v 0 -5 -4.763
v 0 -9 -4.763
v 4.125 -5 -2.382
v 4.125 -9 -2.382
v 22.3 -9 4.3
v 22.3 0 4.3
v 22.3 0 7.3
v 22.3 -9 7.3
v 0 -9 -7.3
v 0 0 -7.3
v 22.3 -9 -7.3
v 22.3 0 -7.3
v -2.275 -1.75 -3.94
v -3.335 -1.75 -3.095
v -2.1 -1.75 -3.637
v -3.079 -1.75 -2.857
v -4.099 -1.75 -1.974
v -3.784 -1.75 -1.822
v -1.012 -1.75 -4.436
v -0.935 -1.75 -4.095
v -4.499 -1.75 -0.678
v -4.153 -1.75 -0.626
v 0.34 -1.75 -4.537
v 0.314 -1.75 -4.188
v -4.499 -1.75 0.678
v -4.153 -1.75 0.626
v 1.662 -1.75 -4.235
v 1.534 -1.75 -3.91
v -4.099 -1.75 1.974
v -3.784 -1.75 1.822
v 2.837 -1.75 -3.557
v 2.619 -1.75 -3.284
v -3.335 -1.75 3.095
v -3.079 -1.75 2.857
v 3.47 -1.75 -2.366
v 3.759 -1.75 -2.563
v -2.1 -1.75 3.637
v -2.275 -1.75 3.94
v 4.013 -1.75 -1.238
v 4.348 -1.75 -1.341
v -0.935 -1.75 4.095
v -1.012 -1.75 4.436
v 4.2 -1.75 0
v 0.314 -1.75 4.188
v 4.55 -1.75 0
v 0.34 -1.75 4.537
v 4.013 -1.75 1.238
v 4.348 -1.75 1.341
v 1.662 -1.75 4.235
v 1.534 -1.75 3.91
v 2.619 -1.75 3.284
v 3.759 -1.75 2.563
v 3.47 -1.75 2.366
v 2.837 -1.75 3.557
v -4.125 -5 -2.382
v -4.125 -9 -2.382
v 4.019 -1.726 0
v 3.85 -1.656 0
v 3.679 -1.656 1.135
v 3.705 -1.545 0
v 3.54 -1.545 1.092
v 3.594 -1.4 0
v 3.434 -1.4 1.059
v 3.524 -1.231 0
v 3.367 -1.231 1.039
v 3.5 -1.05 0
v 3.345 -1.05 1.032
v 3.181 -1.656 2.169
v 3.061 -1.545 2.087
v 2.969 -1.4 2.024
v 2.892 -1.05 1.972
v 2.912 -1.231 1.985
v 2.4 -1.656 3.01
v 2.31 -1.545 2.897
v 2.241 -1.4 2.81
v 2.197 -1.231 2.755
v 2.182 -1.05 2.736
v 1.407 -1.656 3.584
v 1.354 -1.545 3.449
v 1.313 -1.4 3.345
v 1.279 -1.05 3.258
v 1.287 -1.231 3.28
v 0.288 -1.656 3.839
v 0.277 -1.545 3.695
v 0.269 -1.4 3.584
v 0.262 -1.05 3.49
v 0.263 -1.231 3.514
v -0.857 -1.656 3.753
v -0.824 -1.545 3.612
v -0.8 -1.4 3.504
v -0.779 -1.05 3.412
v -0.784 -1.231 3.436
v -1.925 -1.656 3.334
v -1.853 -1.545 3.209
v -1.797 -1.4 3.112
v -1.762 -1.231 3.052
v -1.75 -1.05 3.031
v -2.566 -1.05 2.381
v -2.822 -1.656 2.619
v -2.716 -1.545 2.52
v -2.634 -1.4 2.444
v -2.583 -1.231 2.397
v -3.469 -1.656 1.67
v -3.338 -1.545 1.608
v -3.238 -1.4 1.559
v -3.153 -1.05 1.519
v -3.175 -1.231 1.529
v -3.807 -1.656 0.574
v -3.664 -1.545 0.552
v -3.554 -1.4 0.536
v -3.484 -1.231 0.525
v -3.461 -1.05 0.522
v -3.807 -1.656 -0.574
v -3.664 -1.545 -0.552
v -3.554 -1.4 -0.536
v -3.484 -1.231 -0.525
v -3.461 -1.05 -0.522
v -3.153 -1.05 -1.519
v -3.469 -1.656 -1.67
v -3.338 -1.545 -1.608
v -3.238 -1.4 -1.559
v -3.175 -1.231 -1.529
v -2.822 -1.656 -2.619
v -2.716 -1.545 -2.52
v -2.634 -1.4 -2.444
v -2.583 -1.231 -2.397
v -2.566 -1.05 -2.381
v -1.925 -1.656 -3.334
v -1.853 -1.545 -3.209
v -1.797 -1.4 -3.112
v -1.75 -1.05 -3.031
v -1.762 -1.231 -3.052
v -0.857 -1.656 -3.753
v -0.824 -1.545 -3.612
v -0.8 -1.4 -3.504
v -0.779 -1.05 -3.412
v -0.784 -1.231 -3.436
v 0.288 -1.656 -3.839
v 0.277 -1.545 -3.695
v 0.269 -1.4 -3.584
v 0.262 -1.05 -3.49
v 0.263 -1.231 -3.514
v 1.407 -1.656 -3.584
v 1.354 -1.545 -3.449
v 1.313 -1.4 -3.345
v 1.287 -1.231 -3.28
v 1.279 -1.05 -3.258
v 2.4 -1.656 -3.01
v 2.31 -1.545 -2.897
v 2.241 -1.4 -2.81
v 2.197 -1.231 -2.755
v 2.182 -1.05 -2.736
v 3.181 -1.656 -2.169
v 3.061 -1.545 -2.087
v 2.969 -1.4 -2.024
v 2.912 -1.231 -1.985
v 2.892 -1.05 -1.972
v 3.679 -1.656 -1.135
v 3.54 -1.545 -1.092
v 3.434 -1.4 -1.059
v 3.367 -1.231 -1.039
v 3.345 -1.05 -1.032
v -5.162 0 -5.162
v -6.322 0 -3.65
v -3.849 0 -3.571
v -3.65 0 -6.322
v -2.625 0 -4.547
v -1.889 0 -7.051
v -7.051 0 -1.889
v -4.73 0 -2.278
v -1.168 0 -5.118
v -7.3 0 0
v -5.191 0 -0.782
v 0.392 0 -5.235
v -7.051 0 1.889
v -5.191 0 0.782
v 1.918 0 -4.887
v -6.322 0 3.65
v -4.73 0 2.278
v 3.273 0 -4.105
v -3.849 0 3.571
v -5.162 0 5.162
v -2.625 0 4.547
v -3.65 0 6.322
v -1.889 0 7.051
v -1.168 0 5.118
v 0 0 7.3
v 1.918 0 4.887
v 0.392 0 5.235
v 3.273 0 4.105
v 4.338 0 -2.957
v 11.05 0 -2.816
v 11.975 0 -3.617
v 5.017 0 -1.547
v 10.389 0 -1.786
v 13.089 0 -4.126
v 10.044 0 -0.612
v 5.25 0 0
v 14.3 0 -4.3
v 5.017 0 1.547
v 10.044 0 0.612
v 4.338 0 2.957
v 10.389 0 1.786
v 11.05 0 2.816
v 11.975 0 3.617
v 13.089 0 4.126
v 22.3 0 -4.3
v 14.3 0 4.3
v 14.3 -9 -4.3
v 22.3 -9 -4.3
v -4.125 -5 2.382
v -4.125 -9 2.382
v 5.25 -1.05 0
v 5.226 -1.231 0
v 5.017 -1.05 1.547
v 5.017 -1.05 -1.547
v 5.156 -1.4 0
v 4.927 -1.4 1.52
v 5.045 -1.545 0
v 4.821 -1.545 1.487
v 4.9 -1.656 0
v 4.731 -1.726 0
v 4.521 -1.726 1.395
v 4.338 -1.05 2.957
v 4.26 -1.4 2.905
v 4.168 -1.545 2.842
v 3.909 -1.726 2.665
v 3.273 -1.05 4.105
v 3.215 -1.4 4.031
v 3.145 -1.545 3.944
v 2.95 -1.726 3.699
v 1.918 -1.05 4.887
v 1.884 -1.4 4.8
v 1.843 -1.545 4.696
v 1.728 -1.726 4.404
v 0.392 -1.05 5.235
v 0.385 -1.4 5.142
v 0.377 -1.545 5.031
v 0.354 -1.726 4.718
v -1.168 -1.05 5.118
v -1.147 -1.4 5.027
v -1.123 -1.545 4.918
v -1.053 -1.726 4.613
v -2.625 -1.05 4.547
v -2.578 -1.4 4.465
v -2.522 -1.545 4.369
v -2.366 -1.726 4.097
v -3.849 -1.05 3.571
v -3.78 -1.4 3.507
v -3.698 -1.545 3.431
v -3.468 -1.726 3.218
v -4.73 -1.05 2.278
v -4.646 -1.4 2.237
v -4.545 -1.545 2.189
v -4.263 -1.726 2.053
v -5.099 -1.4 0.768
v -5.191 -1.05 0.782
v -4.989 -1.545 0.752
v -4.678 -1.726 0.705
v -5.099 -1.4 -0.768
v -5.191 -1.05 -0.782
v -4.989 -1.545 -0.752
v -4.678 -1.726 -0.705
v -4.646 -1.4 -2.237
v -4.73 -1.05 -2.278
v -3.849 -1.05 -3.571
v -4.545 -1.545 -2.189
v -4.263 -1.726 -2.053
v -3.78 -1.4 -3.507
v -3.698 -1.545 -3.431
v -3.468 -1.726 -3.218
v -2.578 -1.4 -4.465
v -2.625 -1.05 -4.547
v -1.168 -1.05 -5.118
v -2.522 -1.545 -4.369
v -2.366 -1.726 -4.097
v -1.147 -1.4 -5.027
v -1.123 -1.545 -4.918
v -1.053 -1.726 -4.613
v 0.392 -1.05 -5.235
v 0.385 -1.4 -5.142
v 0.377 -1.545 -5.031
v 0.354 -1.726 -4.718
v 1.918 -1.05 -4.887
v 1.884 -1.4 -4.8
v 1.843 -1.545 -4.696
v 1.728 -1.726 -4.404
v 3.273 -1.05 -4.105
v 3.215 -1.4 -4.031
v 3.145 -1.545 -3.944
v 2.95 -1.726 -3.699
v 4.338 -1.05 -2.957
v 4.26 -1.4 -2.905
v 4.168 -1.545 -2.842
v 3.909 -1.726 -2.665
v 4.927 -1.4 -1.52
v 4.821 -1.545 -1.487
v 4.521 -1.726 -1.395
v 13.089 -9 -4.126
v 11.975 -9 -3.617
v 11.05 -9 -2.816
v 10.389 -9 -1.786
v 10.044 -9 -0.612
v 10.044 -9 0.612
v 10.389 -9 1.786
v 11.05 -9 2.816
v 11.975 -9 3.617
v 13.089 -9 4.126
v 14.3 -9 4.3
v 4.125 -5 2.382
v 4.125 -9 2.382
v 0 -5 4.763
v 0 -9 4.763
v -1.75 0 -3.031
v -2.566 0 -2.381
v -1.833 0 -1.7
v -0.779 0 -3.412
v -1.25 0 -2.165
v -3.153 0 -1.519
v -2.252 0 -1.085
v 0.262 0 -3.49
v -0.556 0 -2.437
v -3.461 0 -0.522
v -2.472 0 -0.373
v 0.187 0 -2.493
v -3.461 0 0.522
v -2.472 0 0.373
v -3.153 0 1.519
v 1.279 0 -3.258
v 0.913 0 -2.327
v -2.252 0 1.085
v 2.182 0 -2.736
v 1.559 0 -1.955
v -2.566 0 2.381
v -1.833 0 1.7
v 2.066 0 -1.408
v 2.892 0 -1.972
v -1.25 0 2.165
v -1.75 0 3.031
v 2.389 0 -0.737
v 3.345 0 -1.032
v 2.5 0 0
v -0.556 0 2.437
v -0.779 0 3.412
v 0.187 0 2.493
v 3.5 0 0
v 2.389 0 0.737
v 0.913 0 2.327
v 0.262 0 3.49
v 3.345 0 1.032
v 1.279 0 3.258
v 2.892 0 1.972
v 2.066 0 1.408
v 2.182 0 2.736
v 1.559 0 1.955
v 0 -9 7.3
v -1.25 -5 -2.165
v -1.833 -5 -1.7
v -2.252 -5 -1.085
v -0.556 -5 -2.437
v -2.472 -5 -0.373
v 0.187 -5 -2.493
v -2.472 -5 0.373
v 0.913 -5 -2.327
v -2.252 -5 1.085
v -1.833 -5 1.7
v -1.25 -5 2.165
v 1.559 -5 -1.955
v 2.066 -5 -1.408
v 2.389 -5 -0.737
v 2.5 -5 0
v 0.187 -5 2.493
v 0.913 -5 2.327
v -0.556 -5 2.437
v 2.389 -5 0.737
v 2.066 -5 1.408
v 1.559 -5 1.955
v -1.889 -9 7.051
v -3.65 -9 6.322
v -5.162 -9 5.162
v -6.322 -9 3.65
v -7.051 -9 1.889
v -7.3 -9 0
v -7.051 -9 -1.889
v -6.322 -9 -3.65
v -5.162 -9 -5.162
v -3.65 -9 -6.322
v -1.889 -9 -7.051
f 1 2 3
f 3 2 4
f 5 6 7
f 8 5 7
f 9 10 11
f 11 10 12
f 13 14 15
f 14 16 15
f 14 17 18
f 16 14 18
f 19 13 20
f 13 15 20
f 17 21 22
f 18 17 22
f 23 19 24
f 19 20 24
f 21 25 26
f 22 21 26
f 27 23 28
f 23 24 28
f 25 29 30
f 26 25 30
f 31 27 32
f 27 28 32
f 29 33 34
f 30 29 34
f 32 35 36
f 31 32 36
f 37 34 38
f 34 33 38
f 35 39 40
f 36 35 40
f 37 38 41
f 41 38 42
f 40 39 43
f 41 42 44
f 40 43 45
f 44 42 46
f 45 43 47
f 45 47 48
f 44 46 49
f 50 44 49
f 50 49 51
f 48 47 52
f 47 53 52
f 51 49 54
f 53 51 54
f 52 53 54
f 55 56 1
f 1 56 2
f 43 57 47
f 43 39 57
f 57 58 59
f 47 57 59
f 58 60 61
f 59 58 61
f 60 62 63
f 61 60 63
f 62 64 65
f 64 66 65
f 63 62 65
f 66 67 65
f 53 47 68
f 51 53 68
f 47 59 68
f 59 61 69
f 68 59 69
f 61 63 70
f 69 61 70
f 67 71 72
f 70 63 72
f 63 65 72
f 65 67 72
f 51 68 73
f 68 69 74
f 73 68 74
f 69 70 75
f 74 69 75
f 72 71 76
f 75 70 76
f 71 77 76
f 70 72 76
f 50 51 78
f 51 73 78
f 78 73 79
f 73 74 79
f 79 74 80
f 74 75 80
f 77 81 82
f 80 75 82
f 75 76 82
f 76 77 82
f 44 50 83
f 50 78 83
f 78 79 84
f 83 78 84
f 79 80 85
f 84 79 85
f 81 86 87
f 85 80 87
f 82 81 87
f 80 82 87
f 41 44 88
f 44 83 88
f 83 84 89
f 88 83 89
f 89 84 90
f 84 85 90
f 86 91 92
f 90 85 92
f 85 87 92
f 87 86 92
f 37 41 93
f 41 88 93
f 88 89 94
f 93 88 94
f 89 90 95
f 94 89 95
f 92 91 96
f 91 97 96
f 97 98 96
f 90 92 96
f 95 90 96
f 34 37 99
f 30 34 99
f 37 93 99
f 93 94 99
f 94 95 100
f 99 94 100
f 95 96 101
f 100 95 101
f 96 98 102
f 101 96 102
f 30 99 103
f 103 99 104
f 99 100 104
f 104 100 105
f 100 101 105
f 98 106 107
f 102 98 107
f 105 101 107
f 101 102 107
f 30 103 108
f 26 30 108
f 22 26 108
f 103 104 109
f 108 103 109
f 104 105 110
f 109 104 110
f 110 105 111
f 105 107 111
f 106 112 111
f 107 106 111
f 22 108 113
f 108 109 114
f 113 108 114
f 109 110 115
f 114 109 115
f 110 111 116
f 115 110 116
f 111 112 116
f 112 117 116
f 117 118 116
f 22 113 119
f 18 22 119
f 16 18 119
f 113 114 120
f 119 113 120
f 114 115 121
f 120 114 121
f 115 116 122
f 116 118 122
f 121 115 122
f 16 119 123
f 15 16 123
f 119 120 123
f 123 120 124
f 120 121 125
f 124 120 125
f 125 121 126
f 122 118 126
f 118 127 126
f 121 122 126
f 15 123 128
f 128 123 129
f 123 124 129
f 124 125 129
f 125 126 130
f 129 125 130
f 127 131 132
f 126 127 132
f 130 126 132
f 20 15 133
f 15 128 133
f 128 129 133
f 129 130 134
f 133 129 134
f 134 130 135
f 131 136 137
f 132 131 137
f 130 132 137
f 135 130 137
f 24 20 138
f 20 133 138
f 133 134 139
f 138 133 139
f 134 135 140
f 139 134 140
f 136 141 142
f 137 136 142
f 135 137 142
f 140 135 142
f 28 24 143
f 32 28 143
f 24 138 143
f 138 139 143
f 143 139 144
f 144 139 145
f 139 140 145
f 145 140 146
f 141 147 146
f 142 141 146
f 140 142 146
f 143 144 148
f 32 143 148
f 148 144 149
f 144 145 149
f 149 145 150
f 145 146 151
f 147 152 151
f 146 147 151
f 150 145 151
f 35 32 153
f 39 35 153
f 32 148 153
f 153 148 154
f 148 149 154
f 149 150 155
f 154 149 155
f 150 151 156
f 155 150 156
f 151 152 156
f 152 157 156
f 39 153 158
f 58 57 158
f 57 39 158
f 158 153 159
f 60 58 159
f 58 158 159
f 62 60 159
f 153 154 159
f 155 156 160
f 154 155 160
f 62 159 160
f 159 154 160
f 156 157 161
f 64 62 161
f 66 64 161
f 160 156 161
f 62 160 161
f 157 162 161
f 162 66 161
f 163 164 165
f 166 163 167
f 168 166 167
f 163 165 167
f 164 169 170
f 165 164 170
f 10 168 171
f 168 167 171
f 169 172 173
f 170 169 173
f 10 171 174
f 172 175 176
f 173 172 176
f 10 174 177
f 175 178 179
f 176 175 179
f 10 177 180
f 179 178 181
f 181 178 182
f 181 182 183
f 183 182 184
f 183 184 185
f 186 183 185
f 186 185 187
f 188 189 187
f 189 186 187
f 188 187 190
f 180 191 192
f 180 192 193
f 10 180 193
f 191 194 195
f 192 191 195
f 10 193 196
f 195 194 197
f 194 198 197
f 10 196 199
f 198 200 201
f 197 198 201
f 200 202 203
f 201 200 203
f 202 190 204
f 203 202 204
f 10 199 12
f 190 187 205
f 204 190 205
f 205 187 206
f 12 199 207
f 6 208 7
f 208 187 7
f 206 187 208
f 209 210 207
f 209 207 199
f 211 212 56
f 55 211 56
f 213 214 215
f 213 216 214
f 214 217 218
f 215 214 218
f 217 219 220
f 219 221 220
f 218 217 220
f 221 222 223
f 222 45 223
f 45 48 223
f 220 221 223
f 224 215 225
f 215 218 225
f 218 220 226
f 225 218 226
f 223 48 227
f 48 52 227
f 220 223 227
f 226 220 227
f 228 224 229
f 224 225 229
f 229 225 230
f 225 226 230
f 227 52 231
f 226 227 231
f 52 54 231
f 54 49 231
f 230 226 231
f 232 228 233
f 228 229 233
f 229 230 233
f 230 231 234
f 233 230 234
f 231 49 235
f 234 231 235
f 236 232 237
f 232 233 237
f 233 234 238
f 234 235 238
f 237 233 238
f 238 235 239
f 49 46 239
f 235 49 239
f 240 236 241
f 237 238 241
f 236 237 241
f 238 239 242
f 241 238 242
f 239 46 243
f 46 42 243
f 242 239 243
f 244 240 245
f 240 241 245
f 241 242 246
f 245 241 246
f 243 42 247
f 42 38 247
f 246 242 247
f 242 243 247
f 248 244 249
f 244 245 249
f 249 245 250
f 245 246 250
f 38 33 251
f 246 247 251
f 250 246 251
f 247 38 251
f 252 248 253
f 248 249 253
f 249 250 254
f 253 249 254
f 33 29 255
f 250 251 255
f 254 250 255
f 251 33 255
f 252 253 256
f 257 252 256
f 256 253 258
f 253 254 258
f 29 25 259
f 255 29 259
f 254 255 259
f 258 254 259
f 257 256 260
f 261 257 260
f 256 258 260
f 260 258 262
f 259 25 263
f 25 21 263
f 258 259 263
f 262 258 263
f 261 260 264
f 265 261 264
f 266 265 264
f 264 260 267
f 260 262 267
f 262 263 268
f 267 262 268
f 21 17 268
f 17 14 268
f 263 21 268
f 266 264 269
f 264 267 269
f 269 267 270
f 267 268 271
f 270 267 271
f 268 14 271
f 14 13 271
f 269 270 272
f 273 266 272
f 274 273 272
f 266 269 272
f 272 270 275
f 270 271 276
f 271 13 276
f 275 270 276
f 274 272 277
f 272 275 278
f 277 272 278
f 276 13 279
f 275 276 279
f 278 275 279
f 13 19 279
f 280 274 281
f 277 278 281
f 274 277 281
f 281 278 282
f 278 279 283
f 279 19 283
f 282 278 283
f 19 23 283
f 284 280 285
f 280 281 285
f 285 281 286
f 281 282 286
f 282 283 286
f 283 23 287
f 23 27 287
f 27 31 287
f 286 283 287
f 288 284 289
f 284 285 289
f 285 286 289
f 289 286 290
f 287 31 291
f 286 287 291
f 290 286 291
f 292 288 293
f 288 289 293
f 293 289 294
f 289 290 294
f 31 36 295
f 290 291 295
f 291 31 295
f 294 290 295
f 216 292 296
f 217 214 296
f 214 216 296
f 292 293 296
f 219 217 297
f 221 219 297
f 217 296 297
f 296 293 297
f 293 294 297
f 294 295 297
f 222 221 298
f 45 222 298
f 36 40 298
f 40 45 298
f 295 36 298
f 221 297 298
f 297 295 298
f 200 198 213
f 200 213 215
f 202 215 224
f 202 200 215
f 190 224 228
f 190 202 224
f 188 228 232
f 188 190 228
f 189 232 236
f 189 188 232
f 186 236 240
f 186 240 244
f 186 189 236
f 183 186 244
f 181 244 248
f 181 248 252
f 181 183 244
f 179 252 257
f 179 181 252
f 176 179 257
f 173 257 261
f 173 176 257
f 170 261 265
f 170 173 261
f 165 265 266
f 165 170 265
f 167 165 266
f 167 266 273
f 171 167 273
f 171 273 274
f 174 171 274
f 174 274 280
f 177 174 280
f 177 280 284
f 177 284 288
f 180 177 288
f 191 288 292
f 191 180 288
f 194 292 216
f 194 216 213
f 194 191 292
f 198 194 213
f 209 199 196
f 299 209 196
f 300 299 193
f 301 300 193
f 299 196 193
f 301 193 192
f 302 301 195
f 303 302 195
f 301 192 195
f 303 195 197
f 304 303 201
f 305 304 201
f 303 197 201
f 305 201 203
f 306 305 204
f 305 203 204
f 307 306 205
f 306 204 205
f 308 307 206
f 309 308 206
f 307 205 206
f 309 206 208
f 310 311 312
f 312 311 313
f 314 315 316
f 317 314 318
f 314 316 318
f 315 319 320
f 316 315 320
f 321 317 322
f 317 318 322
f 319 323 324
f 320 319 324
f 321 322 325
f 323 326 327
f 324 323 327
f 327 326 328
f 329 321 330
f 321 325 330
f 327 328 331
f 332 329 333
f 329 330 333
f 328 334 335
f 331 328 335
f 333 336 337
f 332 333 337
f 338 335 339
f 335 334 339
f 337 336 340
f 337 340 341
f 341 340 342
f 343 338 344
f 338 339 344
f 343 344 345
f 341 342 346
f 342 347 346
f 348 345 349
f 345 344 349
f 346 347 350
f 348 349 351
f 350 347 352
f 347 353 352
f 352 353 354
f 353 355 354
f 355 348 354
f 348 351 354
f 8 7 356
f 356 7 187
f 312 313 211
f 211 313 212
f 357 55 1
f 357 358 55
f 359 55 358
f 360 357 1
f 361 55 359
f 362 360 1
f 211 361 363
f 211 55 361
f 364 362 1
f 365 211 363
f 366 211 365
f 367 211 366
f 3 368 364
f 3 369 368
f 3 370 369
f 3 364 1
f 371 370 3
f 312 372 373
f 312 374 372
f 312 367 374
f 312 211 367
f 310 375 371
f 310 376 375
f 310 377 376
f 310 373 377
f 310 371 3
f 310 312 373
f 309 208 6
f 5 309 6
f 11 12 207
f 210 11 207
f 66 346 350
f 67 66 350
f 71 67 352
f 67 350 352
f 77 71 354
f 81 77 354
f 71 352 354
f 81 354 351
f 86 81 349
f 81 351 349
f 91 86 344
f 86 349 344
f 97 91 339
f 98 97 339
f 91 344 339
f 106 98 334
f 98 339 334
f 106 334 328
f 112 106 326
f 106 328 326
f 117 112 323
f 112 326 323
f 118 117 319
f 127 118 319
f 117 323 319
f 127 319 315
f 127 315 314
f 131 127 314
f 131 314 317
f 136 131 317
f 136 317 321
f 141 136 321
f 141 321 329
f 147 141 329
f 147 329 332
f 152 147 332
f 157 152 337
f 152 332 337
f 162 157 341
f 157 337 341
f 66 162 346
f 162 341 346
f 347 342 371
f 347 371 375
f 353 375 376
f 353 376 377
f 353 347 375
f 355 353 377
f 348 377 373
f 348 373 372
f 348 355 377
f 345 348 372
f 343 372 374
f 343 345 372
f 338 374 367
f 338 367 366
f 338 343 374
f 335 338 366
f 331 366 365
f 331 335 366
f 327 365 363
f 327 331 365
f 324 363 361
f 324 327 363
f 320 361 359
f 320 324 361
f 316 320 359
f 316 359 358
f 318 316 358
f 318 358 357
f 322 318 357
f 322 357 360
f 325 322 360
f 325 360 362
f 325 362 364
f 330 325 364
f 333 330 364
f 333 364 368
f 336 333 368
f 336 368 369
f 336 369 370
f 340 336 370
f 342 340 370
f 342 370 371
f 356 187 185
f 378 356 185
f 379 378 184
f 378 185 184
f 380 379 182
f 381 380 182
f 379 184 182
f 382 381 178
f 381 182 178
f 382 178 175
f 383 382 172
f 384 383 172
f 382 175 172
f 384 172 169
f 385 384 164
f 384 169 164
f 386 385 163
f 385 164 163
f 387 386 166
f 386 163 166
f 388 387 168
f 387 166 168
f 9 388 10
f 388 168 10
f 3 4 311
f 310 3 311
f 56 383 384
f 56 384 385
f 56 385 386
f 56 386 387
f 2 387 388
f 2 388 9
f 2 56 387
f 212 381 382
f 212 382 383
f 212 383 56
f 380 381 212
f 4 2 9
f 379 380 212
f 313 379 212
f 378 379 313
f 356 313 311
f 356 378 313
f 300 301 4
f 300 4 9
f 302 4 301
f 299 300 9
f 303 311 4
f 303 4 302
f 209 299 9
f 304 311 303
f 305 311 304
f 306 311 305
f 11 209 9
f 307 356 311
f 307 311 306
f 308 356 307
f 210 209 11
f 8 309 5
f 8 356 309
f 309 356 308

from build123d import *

# Parameters (mm, degrees)
F0_R     = 2.5
F1_DEPTH = 9
F2_R     = 2.5
F3_DEPTH = 4
F4_R     = 5.25
F4_R_2   = 3.5
F5_DEPTH = 1.75
F6_R     = 0.7


with BuildPart() as f1:
    # F0 (on Front) → F1 (new body)
    with BuildSketch(Plane.XZ):
        with BuildLine():
            Line((22.3, 4.3), (22.3, 7.3))
            Line((22.3, 7.3), (0, 7.3))
            ThreePointArc((0, 7.3), (-7.3, 0), (0, -7.3))
            Line((0, -7.3), (22.3, -7.3))
            Line((22.3, -7.3), (22.3, -4.3))
            Line((22.3, -4.3), (14.3, -4.3))
            ThreePointArc((14.3, -4.3), (10, 0), (14.3, 4.3))
            Line((14.3, 4.3), (22.3, 4.3))
        make_face()
        Circle(F0_R, mode=Mode.SUBTRACT)
    extrude(amount=F1_DEPTH)

    # F2 (on face) → F3 (cut)
    with BuildSketch(Plane.XZ.offset(9)):
        Polygon((4.125, -2.38157), (4.125, 2.38157), (0, 4.76314), (-4.125, 2.38157), (-4.125, -2.38157), (0, -4.76314), align=None)
        Circle(F2_R, mode=Mode.SUBTRACT)
    extrude(amount=-F3_DEPTH, mode=Mode.SUBTRACT)

    # F4 (on Front) → F5 (cut)
    with BuildSketch(Plane.XZ):
        Circle(F4_R)
        Circle(F4_R_2, mode=Mode.SUBTRACT)
    extrude(amount=F5_DEPTH, mode=Mode.SUBTRACT)

    # F6
    f6_edges = [f1.edges().sort_by_distance(p)[0] for p in [
        (-5.25, -1.75, 0),
        (-3.5, -1.75, 0),
    ]]
    fillet(f6_edges, radius=F6_R)


solid = f1.part
